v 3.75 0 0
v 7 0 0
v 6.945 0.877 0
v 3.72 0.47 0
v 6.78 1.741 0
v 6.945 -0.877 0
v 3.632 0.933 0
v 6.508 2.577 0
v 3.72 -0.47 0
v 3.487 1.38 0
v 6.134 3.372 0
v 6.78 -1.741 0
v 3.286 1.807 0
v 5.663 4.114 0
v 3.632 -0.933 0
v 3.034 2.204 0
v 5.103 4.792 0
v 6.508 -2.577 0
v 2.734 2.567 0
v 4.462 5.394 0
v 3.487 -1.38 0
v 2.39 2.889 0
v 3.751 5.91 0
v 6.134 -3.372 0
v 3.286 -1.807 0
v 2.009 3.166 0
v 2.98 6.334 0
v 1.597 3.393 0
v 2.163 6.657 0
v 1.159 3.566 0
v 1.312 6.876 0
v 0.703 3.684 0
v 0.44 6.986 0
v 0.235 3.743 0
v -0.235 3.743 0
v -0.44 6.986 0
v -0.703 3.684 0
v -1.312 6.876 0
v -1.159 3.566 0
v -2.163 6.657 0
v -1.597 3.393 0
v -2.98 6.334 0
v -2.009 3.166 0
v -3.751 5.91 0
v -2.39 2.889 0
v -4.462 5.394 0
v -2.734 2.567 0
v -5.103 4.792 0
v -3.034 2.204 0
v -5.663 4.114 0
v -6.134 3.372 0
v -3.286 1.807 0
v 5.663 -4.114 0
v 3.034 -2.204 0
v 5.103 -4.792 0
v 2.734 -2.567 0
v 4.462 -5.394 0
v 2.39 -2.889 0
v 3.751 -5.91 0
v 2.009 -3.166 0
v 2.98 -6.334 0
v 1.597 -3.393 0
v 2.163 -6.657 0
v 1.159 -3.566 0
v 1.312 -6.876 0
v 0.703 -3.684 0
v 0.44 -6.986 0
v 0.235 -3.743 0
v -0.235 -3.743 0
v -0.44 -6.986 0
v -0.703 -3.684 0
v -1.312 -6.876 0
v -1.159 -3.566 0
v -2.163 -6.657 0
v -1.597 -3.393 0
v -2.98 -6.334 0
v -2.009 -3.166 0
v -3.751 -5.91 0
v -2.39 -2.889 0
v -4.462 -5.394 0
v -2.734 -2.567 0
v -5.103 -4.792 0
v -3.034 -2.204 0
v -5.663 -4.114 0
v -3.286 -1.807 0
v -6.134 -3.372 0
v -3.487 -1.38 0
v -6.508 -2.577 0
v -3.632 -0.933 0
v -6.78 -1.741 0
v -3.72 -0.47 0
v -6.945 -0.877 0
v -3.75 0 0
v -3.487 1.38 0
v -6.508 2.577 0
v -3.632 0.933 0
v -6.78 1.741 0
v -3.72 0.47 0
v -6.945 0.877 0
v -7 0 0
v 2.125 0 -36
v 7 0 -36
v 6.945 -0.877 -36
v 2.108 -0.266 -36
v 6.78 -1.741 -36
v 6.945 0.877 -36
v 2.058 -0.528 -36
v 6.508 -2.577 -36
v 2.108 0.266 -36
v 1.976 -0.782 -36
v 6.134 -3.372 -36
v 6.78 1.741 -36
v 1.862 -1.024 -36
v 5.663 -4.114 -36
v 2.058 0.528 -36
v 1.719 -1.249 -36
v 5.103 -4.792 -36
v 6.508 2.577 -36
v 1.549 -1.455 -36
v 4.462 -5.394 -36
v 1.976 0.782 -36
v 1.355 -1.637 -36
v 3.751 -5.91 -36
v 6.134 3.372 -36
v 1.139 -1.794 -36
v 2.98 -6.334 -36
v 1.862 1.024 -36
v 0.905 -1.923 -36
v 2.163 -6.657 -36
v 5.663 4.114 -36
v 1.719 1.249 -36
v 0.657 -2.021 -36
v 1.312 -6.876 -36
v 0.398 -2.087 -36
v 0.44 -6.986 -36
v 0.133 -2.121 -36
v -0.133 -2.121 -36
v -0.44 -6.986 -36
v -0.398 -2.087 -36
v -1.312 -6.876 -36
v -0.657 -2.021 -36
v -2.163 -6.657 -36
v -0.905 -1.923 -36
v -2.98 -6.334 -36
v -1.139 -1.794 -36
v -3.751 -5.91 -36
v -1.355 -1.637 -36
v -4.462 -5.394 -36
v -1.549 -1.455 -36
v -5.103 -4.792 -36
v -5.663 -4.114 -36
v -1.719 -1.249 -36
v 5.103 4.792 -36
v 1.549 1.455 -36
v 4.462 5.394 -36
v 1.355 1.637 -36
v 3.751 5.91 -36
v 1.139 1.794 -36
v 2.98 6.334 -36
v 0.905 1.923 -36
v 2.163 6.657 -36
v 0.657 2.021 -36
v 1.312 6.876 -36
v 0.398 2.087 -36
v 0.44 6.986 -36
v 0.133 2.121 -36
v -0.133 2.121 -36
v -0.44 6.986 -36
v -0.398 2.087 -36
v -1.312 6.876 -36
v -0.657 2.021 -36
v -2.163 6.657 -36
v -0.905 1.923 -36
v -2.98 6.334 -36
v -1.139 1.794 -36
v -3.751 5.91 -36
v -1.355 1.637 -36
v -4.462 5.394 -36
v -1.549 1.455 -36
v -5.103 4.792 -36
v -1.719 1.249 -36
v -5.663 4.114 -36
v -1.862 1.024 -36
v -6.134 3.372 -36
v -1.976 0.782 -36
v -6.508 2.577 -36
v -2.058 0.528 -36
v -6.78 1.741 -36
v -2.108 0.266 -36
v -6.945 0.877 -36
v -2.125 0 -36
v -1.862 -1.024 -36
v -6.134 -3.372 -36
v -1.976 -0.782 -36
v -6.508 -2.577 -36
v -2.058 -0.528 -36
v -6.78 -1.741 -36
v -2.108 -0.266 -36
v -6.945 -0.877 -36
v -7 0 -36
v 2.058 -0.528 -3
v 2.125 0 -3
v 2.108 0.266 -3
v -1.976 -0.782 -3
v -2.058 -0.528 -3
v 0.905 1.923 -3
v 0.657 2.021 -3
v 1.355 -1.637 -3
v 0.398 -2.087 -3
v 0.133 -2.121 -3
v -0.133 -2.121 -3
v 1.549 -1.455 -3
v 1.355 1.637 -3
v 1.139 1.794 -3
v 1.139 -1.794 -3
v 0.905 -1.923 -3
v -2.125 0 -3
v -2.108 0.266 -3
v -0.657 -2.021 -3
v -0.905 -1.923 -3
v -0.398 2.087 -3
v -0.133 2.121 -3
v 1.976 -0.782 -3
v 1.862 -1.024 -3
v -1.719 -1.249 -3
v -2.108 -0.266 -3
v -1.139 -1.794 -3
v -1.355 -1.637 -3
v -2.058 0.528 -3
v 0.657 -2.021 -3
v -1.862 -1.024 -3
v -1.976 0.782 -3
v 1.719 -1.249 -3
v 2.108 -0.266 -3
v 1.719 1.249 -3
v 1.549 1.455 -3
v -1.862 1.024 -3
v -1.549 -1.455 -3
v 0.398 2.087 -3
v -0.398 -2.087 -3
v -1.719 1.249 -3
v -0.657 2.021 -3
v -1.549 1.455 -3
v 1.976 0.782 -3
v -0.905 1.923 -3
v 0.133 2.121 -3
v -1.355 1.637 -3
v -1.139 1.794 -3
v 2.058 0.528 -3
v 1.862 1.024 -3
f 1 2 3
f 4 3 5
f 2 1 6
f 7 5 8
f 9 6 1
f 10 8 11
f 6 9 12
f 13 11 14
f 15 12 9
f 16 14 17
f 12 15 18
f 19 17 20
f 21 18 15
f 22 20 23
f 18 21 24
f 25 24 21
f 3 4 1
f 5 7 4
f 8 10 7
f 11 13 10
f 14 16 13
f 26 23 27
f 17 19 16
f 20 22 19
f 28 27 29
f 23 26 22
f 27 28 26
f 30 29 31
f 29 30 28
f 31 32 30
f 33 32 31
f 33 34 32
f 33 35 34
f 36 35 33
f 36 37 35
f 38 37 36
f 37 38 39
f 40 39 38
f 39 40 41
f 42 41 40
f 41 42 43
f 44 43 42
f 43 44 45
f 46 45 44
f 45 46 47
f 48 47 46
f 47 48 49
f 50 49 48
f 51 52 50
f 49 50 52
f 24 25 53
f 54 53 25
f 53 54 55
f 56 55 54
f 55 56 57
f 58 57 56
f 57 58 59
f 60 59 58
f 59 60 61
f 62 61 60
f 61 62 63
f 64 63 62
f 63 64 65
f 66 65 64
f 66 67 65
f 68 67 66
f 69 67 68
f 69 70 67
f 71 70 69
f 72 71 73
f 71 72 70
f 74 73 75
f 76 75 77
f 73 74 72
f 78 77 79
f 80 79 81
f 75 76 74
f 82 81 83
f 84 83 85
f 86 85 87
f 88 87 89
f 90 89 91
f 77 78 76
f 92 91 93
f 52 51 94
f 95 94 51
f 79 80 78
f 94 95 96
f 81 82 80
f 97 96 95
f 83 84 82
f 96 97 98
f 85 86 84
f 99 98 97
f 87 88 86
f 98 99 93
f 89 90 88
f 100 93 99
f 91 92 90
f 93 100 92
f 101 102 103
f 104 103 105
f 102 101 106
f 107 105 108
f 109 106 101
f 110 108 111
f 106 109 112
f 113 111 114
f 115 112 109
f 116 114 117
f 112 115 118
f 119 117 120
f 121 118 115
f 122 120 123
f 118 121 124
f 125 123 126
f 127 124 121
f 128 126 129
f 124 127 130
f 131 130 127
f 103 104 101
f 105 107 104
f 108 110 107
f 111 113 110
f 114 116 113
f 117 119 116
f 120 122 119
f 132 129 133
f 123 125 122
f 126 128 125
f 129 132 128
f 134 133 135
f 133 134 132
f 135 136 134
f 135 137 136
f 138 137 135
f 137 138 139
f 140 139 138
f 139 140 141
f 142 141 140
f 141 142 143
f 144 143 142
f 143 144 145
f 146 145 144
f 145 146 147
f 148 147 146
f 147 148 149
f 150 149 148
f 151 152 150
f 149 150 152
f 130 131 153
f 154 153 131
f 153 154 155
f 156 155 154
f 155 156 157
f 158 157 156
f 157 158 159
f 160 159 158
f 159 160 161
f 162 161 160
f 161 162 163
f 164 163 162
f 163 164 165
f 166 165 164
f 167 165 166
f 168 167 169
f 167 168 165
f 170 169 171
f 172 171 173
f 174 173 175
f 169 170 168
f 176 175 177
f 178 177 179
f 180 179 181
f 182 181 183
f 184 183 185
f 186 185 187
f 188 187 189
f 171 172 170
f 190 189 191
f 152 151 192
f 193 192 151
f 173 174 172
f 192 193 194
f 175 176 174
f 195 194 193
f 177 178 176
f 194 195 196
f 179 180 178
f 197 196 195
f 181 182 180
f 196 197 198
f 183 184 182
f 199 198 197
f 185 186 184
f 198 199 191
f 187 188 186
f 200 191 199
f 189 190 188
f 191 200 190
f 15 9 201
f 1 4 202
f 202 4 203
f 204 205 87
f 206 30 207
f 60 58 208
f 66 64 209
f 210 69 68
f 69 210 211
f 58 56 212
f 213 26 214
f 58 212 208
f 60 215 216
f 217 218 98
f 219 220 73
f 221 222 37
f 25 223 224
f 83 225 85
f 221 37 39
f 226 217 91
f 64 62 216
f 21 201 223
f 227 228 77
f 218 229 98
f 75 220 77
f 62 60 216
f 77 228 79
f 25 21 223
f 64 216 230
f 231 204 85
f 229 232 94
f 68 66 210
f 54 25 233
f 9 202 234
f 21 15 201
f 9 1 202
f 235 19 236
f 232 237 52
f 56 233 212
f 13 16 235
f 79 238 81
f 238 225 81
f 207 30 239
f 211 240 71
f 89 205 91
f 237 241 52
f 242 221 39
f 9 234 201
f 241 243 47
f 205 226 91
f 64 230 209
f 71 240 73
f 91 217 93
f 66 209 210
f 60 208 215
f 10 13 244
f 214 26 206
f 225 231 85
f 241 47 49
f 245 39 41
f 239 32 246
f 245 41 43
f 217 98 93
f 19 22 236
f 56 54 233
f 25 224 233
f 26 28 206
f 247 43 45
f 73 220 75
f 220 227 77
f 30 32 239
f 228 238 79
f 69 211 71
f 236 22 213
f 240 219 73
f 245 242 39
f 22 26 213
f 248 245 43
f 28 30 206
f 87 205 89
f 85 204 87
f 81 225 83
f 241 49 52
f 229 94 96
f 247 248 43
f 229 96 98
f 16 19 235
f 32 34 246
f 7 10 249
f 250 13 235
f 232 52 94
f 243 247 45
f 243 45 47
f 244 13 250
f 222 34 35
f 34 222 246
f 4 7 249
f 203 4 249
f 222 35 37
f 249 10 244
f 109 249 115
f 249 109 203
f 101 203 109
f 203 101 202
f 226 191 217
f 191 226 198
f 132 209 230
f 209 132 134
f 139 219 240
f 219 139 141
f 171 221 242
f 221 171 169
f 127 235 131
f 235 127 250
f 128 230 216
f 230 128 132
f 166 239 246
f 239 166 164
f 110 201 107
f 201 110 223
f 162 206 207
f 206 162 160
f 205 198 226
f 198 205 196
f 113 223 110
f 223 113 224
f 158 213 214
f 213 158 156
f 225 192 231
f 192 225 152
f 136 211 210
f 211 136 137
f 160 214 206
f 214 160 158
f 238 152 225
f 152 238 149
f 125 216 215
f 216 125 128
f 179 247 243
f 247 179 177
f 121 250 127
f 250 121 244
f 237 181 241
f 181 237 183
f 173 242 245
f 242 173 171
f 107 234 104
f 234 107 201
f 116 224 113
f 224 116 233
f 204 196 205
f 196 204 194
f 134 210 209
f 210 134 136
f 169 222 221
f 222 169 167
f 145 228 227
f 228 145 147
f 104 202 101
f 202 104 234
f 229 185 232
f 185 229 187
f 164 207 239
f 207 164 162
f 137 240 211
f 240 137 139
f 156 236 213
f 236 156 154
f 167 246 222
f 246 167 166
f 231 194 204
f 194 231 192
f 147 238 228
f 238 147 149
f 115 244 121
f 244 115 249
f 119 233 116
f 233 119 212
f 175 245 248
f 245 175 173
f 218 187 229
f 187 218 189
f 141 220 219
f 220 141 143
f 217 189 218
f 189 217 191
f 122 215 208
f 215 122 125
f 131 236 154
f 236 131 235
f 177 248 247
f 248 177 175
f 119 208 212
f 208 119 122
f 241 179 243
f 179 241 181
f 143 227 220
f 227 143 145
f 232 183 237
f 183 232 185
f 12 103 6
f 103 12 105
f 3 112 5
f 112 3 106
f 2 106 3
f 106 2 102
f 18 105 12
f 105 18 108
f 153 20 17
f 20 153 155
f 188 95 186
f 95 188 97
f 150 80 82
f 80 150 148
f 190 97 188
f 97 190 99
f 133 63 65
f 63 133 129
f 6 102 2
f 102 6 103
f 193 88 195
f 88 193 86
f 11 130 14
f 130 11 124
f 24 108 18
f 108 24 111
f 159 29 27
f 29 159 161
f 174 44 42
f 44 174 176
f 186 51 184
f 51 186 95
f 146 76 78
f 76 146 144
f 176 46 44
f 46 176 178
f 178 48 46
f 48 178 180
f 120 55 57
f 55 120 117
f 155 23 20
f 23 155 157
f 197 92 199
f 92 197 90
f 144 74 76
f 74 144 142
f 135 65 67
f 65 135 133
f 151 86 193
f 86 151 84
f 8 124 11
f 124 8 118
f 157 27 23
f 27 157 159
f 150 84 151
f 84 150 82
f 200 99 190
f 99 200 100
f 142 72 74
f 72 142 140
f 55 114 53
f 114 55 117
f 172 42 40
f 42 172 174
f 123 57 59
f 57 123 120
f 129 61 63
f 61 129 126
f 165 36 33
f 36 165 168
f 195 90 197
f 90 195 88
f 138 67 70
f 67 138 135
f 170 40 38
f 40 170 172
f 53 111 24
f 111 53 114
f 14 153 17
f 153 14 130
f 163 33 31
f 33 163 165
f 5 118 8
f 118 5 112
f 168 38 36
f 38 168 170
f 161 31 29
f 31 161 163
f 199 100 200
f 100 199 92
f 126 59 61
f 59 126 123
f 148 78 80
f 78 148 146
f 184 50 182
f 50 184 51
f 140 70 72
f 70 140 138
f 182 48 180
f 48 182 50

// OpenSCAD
$fn = 50;


difference() {
	union() {
		translate(v = [0, 0, -36.0000000000]) {
			cylinder(h = 36, r = 7.0000000000);
		}
		cylinder(h = 0, r = 10.0000000000);
	}
	union() {
		translate(v = [0, 0, 0]) {
			rotate(a = [0, 0, 0]) {
				difference() {
					union() {
						#translate(v = [0, 0, -36.0000000000]) {
							cylinder(h = 36, r = 2.0000000000);
						}
						#translate(v = [0, 0, -3]) {
							cylinder(h = 3, r1 = 2.1250000000, r2 = 3.7500000000);
						}
						#translate(v = [0, 0, -36.0000000000]) {
							cylinder(h = 36, r = 2.1250000000);
						}
						#translate(v = [0, 0, -36.0000000000]) {
							cylinder(h = 36, r = 2.0000000000);
						}
					}
					union();
				}
			}
		}
	}
}
